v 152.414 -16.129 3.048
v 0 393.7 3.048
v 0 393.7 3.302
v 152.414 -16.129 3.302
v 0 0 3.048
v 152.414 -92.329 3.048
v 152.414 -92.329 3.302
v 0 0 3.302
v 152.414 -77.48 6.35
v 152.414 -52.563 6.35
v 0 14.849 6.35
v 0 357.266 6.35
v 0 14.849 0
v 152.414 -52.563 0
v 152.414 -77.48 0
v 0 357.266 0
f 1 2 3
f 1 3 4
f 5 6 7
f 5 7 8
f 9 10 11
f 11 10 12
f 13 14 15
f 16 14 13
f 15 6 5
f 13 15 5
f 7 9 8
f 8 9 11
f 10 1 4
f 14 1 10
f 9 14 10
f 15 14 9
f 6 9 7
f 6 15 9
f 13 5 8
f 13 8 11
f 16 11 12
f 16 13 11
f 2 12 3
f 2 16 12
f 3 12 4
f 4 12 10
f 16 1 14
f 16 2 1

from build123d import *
from OCP.BRepFilletAPI import BRepFilletAPI_MakeChamfer

# Parameters (mm, degrees)
BOSS_EXTRUDE1_DEPTH = 6.35
CHAMFER1_SIZE       = 12.7
CHAMFER1_SIZE2      = 3.048
CHAMFER2_SIZE       = 3.048
CHAMFER2_SIZE2      = 12.7


with BuildPart() as part:
    # Sketch2 → Boss-Extrude1 (new body)
    with BuildSketch(Plane.XY):
        Polygon((0, 0), (0, 393.7), (152.414038874, -16.129), (152.414038874, -92.329), align=None)
    extrude(amount=BOSS_EXTRUDE1_DEPTH)

    # Chamfer1
    chamfer1_edges = [part.edges().sort_by_distance(p)[0] for p in [
        (76.207019437, 188.7855, 0),
        (76.207019437, -46.1645, 0),
    ]]
    chamfer1_side = [part.faces().sort_by_distance(p)[0] for p in [
        (59.04327632, 99.585162162, 0),
    ]]
    chamfer(chamfer1_edges, length=CHAMFER1_SIZE, length2=CHAMFER1_SIZE2, reference=chamfer1_side[0])

    # Chamfer2: one chamfer whose edges measure the first distance from different faces: ONE call of the kernel's chamfer builder (chamfer() names one face for all edges)
    chamfer2_edges_1 = [part.edges().sort_by_distance(p)[0] for p in [
        (76.207019437, 188.7855, 6.35),
    ]]
    chamfer2_side_1 = [part.faces().sort_by_distance(p)[0] for p in [
        (76.207019437, 188.7855, 4.699),
    ]]
    chamfer2_edges_2 = [part.edges().sort_by_distance(p)[0] for p in [
        (76.207019437, -46.1645, 6.35),
    ]]
    chamfer2_side_2 = [part.faces().sort_by_distance(p)[0] for p in [
        (76.207019437, -46.1645, 4.699),
    ]]
    chamfer2 = BRepFilletAPI_MakeChamfer(part.part.solid().wrapped)
    for e in chamfer2_edges_1:
        chamfer2.Add(CHAMFER2_SIZE, CHAMFER2_SIZE2, e.wrapped, chamfer2_side_1[0].wrapped)  # the first distance lies on this face
    for e in chamfer2_edges_2:
        chamfer2.Add(CHAMFER2_SIZE, CHAMFER2_SIZE2, e.wrapped, chamfer2_side_2[0].wrapped)  # the first distance lies on this face
    add(Compound.cast(chamfer2.Shape()), mode=Mode.REPLACE)


solid = part.part
